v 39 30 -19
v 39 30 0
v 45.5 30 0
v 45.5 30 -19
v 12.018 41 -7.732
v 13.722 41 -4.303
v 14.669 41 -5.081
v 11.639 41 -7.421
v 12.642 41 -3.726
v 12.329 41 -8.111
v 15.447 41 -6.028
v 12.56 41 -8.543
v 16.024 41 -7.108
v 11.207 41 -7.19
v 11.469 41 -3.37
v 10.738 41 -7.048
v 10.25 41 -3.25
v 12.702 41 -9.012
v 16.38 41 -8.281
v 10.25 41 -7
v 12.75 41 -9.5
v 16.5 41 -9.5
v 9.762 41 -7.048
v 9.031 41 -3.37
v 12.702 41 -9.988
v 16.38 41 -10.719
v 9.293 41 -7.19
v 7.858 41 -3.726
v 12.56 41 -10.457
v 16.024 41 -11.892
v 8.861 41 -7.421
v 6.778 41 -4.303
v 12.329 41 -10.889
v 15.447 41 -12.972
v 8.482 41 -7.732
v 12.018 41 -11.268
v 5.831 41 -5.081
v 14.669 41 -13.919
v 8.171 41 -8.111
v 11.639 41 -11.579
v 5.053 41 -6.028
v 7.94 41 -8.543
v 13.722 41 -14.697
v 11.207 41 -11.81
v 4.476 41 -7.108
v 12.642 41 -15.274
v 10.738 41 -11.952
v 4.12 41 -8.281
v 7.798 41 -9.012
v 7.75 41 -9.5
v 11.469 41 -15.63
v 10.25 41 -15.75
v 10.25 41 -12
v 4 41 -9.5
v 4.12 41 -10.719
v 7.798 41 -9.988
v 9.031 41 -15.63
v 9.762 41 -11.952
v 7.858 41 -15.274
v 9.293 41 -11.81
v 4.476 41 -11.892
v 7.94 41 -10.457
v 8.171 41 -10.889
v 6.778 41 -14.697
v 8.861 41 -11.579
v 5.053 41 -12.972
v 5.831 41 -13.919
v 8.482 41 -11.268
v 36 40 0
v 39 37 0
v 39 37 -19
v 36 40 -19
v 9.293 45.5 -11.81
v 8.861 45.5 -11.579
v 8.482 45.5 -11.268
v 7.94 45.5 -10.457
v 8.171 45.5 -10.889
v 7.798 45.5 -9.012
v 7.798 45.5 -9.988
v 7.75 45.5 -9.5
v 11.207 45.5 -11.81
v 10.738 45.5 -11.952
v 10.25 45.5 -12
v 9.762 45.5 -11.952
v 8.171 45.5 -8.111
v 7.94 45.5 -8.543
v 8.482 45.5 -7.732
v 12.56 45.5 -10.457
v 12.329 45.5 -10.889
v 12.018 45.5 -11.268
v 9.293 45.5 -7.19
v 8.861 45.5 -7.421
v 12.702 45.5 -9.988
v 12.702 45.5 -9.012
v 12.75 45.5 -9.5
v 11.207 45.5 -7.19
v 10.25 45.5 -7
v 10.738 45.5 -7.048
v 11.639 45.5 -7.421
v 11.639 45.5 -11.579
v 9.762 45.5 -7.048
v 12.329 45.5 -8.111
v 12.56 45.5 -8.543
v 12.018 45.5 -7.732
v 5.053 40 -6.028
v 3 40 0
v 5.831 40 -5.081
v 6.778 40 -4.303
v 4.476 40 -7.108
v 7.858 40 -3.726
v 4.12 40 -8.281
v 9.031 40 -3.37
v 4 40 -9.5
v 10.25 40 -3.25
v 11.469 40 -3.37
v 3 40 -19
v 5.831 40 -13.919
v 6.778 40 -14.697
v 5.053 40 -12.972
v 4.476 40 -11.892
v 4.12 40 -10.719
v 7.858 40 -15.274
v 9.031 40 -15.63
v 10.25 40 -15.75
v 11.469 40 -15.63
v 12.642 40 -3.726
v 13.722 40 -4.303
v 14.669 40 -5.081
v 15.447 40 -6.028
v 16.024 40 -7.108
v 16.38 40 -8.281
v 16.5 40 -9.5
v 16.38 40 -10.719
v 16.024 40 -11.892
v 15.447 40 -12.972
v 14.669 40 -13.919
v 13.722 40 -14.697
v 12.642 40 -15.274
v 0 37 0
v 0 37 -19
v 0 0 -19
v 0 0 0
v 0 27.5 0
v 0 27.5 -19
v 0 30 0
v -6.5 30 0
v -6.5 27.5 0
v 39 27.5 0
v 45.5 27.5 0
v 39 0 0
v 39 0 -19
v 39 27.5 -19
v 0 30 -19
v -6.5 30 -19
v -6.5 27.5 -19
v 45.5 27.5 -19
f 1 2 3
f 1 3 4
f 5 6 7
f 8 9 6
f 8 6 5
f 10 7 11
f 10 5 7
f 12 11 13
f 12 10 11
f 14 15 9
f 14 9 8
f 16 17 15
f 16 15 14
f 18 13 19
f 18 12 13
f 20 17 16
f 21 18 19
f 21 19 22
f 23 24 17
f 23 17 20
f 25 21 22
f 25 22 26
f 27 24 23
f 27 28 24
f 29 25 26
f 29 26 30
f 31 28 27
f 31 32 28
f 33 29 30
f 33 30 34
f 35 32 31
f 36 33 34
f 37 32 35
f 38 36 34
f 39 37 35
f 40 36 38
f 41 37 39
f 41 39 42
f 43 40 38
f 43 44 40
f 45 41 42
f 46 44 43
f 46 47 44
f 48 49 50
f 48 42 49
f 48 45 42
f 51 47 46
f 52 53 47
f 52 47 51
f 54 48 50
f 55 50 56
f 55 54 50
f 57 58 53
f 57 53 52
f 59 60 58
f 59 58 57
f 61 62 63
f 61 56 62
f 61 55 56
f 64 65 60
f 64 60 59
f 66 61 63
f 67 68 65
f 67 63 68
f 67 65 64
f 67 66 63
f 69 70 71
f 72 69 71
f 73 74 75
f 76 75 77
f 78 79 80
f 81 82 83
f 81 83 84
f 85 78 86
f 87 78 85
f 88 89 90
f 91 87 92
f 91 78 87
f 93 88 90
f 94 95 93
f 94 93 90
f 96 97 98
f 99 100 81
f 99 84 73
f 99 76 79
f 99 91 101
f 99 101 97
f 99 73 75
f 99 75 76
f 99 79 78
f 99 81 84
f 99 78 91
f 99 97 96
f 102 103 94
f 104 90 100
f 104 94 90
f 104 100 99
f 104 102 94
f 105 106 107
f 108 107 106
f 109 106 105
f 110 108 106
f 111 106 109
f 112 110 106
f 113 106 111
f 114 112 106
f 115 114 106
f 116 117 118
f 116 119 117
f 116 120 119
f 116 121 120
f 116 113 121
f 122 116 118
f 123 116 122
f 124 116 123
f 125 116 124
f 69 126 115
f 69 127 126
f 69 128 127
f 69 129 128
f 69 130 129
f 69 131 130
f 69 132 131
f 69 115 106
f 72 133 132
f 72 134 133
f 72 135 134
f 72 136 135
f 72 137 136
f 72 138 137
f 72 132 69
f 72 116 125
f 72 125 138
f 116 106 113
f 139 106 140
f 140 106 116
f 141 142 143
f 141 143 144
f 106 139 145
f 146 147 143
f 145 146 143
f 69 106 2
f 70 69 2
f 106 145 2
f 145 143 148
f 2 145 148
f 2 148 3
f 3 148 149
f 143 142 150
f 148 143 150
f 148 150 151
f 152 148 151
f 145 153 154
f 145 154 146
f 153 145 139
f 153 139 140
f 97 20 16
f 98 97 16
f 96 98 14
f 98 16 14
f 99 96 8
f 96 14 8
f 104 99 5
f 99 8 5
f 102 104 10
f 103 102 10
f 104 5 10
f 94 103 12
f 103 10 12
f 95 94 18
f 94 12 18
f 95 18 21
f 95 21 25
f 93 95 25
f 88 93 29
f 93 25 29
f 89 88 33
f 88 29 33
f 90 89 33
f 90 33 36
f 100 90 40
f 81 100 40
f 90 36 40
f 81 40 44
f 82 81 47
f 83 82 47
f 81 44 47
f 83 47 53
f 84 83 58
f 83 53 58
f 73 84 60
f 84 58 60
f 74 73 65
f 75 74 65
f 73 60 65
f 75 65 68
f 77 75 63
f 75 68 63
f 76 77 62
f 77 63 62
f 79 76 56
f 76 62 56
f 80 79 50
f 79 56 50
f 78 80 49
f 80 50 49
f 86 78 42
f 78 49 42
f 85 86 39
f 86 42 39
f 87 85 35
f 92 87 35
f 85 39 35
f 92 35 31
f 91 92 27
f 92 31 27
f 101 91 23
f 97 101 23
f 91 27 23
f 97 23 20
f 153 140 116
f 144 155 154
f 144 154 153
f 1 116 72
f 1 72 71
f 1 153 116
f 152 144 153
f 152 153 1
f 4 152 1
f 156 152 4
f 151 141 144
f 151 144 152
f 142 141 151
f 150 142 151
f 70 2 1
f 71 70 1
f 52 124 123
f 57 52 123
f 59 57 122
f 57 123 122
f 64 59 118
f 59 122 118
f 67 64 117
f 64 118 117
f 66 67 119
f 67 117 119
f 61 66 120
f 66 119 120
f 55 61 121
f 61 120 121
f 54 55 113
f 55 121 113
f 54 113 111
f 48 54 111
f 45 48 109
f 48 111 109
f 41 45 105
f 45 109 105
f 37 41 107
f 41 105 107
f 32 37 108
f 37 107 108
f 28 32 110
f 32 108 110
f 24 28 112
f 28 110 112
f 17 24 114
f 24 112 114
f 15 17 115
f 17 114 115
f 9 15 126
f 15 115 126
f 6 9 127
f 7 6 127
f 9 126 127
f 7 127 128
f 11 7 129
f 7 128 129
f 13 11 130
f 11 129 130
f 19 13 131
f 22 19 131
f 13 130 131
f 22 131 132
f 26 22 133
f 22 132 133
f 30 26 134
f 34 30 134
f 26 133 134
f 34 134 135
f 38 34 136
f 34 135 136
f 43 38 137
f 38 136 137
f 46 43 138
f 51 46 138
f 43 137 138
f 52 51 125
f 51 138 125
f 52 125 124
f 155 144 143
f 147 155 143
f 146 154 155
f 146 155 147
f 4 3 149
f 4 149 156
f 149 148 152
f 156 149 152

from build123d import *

# Parameters (mm, degrees)
SKETCH1_W           = 39
SKETCH1_H           = 19
BOSS_EXTRUDE1_DEPTH = 40
SKETCH2_W           = 19
SKETCH2_H           = 2.5
BOSS_EXTRUDE2_DEPTH = 6.5
SKETCH3_W           = 19
SKETCH3_H           = 2.5
BOSS_EXTRUDE3_DEPTH = 6.5
SKETCH4_R           = 6.25
BOSS_EXTRUDE4_DEPTH = 1
SKETCH5_R           = 2.5
BOSS_EXTRUDE5_DEPTH = 4.5
CHAMFER1_SIZE       = 3
CHAMFER2_SIZE       = 3


with BuildPart() as part:
    # Sketch1 → Boss-Extrude1 (new body)
    with BuildSketch(Plane(origin=(0, 0, 0), x_dir=(1, 0, 0), z_dir=(0, 1, 0))):
        with Locations((19.5, 9.5)):
            Rectangle(SKETCH1_W, SKETCH1_H)
    extrude(amount=BOSS_EXTRUDE1_DEPTH)

    # Sketch2 → Boss-Extrude2 (add)
    with BuildSketch(Plane(origin=(39, 0, 0), x_dir=(0, 0, -1), z_dir=(1, 0, 0))):
        with Locations((9.5, 28.75)):
            Rectangle(SKETCH2_W, SKETCH2_H)
    extrude(amount=BOSS_EXTRUDE2_DEPTH)

    # Sketch3 → Boss-Extrude3 (add)
    with BuildSketch(Plane.ZY):
        with Locations((-9.5, 28.75)):
            Rectangle(SKETCH3_W, SKETCH3_H)
    extrude(amount=BOSS_EXTRUDE3_DEPTH)

    # Sketch4 → Boss-Extrude4 (add)
    with BuildSketch(Plane(origin=(0, 40, 0), x_dir=(1, 0, 0), z_dir=(0, 1, 0))):
        with Locations(Location((10.25, 9.5, 0), (0, 0, 90))):
            Circle(SKETCH4_R)
    extrude(amount=BOSS_EXTRUDE4_DEPTH)

    # Sketch5 → Boss-Extrude5 (add)
    with BuildSketch(Plane(origin=(0, 41, 0), x_dir=(1, 0, 0), z_dir=(0, 1, 0))):
        with Locations(Location((10.25, 9.5, 0), (0, 0, 270))):
            Circle(SKETCH5_R)
    extrude(amount=BOSS_EXTRUDE5_DEPTH)

    # Chamfer1
    chamfer1_edges = [part.edges().sort_by_distance(p)[0] for p in [
        (0, 40, -9.5),
    ]]
    chamfer(chamfer1_edges, length=CHAMFER1_SIZE)

    # Chamfer2
    chamfer2_edges = [part.edges().sort_by_distance(p)[0] for p in [
        (39, 40, -9.5),
    ]]
    chamfer(chamfer2_edges, length=CHAMFER2_SIZE)


solid = part.part
